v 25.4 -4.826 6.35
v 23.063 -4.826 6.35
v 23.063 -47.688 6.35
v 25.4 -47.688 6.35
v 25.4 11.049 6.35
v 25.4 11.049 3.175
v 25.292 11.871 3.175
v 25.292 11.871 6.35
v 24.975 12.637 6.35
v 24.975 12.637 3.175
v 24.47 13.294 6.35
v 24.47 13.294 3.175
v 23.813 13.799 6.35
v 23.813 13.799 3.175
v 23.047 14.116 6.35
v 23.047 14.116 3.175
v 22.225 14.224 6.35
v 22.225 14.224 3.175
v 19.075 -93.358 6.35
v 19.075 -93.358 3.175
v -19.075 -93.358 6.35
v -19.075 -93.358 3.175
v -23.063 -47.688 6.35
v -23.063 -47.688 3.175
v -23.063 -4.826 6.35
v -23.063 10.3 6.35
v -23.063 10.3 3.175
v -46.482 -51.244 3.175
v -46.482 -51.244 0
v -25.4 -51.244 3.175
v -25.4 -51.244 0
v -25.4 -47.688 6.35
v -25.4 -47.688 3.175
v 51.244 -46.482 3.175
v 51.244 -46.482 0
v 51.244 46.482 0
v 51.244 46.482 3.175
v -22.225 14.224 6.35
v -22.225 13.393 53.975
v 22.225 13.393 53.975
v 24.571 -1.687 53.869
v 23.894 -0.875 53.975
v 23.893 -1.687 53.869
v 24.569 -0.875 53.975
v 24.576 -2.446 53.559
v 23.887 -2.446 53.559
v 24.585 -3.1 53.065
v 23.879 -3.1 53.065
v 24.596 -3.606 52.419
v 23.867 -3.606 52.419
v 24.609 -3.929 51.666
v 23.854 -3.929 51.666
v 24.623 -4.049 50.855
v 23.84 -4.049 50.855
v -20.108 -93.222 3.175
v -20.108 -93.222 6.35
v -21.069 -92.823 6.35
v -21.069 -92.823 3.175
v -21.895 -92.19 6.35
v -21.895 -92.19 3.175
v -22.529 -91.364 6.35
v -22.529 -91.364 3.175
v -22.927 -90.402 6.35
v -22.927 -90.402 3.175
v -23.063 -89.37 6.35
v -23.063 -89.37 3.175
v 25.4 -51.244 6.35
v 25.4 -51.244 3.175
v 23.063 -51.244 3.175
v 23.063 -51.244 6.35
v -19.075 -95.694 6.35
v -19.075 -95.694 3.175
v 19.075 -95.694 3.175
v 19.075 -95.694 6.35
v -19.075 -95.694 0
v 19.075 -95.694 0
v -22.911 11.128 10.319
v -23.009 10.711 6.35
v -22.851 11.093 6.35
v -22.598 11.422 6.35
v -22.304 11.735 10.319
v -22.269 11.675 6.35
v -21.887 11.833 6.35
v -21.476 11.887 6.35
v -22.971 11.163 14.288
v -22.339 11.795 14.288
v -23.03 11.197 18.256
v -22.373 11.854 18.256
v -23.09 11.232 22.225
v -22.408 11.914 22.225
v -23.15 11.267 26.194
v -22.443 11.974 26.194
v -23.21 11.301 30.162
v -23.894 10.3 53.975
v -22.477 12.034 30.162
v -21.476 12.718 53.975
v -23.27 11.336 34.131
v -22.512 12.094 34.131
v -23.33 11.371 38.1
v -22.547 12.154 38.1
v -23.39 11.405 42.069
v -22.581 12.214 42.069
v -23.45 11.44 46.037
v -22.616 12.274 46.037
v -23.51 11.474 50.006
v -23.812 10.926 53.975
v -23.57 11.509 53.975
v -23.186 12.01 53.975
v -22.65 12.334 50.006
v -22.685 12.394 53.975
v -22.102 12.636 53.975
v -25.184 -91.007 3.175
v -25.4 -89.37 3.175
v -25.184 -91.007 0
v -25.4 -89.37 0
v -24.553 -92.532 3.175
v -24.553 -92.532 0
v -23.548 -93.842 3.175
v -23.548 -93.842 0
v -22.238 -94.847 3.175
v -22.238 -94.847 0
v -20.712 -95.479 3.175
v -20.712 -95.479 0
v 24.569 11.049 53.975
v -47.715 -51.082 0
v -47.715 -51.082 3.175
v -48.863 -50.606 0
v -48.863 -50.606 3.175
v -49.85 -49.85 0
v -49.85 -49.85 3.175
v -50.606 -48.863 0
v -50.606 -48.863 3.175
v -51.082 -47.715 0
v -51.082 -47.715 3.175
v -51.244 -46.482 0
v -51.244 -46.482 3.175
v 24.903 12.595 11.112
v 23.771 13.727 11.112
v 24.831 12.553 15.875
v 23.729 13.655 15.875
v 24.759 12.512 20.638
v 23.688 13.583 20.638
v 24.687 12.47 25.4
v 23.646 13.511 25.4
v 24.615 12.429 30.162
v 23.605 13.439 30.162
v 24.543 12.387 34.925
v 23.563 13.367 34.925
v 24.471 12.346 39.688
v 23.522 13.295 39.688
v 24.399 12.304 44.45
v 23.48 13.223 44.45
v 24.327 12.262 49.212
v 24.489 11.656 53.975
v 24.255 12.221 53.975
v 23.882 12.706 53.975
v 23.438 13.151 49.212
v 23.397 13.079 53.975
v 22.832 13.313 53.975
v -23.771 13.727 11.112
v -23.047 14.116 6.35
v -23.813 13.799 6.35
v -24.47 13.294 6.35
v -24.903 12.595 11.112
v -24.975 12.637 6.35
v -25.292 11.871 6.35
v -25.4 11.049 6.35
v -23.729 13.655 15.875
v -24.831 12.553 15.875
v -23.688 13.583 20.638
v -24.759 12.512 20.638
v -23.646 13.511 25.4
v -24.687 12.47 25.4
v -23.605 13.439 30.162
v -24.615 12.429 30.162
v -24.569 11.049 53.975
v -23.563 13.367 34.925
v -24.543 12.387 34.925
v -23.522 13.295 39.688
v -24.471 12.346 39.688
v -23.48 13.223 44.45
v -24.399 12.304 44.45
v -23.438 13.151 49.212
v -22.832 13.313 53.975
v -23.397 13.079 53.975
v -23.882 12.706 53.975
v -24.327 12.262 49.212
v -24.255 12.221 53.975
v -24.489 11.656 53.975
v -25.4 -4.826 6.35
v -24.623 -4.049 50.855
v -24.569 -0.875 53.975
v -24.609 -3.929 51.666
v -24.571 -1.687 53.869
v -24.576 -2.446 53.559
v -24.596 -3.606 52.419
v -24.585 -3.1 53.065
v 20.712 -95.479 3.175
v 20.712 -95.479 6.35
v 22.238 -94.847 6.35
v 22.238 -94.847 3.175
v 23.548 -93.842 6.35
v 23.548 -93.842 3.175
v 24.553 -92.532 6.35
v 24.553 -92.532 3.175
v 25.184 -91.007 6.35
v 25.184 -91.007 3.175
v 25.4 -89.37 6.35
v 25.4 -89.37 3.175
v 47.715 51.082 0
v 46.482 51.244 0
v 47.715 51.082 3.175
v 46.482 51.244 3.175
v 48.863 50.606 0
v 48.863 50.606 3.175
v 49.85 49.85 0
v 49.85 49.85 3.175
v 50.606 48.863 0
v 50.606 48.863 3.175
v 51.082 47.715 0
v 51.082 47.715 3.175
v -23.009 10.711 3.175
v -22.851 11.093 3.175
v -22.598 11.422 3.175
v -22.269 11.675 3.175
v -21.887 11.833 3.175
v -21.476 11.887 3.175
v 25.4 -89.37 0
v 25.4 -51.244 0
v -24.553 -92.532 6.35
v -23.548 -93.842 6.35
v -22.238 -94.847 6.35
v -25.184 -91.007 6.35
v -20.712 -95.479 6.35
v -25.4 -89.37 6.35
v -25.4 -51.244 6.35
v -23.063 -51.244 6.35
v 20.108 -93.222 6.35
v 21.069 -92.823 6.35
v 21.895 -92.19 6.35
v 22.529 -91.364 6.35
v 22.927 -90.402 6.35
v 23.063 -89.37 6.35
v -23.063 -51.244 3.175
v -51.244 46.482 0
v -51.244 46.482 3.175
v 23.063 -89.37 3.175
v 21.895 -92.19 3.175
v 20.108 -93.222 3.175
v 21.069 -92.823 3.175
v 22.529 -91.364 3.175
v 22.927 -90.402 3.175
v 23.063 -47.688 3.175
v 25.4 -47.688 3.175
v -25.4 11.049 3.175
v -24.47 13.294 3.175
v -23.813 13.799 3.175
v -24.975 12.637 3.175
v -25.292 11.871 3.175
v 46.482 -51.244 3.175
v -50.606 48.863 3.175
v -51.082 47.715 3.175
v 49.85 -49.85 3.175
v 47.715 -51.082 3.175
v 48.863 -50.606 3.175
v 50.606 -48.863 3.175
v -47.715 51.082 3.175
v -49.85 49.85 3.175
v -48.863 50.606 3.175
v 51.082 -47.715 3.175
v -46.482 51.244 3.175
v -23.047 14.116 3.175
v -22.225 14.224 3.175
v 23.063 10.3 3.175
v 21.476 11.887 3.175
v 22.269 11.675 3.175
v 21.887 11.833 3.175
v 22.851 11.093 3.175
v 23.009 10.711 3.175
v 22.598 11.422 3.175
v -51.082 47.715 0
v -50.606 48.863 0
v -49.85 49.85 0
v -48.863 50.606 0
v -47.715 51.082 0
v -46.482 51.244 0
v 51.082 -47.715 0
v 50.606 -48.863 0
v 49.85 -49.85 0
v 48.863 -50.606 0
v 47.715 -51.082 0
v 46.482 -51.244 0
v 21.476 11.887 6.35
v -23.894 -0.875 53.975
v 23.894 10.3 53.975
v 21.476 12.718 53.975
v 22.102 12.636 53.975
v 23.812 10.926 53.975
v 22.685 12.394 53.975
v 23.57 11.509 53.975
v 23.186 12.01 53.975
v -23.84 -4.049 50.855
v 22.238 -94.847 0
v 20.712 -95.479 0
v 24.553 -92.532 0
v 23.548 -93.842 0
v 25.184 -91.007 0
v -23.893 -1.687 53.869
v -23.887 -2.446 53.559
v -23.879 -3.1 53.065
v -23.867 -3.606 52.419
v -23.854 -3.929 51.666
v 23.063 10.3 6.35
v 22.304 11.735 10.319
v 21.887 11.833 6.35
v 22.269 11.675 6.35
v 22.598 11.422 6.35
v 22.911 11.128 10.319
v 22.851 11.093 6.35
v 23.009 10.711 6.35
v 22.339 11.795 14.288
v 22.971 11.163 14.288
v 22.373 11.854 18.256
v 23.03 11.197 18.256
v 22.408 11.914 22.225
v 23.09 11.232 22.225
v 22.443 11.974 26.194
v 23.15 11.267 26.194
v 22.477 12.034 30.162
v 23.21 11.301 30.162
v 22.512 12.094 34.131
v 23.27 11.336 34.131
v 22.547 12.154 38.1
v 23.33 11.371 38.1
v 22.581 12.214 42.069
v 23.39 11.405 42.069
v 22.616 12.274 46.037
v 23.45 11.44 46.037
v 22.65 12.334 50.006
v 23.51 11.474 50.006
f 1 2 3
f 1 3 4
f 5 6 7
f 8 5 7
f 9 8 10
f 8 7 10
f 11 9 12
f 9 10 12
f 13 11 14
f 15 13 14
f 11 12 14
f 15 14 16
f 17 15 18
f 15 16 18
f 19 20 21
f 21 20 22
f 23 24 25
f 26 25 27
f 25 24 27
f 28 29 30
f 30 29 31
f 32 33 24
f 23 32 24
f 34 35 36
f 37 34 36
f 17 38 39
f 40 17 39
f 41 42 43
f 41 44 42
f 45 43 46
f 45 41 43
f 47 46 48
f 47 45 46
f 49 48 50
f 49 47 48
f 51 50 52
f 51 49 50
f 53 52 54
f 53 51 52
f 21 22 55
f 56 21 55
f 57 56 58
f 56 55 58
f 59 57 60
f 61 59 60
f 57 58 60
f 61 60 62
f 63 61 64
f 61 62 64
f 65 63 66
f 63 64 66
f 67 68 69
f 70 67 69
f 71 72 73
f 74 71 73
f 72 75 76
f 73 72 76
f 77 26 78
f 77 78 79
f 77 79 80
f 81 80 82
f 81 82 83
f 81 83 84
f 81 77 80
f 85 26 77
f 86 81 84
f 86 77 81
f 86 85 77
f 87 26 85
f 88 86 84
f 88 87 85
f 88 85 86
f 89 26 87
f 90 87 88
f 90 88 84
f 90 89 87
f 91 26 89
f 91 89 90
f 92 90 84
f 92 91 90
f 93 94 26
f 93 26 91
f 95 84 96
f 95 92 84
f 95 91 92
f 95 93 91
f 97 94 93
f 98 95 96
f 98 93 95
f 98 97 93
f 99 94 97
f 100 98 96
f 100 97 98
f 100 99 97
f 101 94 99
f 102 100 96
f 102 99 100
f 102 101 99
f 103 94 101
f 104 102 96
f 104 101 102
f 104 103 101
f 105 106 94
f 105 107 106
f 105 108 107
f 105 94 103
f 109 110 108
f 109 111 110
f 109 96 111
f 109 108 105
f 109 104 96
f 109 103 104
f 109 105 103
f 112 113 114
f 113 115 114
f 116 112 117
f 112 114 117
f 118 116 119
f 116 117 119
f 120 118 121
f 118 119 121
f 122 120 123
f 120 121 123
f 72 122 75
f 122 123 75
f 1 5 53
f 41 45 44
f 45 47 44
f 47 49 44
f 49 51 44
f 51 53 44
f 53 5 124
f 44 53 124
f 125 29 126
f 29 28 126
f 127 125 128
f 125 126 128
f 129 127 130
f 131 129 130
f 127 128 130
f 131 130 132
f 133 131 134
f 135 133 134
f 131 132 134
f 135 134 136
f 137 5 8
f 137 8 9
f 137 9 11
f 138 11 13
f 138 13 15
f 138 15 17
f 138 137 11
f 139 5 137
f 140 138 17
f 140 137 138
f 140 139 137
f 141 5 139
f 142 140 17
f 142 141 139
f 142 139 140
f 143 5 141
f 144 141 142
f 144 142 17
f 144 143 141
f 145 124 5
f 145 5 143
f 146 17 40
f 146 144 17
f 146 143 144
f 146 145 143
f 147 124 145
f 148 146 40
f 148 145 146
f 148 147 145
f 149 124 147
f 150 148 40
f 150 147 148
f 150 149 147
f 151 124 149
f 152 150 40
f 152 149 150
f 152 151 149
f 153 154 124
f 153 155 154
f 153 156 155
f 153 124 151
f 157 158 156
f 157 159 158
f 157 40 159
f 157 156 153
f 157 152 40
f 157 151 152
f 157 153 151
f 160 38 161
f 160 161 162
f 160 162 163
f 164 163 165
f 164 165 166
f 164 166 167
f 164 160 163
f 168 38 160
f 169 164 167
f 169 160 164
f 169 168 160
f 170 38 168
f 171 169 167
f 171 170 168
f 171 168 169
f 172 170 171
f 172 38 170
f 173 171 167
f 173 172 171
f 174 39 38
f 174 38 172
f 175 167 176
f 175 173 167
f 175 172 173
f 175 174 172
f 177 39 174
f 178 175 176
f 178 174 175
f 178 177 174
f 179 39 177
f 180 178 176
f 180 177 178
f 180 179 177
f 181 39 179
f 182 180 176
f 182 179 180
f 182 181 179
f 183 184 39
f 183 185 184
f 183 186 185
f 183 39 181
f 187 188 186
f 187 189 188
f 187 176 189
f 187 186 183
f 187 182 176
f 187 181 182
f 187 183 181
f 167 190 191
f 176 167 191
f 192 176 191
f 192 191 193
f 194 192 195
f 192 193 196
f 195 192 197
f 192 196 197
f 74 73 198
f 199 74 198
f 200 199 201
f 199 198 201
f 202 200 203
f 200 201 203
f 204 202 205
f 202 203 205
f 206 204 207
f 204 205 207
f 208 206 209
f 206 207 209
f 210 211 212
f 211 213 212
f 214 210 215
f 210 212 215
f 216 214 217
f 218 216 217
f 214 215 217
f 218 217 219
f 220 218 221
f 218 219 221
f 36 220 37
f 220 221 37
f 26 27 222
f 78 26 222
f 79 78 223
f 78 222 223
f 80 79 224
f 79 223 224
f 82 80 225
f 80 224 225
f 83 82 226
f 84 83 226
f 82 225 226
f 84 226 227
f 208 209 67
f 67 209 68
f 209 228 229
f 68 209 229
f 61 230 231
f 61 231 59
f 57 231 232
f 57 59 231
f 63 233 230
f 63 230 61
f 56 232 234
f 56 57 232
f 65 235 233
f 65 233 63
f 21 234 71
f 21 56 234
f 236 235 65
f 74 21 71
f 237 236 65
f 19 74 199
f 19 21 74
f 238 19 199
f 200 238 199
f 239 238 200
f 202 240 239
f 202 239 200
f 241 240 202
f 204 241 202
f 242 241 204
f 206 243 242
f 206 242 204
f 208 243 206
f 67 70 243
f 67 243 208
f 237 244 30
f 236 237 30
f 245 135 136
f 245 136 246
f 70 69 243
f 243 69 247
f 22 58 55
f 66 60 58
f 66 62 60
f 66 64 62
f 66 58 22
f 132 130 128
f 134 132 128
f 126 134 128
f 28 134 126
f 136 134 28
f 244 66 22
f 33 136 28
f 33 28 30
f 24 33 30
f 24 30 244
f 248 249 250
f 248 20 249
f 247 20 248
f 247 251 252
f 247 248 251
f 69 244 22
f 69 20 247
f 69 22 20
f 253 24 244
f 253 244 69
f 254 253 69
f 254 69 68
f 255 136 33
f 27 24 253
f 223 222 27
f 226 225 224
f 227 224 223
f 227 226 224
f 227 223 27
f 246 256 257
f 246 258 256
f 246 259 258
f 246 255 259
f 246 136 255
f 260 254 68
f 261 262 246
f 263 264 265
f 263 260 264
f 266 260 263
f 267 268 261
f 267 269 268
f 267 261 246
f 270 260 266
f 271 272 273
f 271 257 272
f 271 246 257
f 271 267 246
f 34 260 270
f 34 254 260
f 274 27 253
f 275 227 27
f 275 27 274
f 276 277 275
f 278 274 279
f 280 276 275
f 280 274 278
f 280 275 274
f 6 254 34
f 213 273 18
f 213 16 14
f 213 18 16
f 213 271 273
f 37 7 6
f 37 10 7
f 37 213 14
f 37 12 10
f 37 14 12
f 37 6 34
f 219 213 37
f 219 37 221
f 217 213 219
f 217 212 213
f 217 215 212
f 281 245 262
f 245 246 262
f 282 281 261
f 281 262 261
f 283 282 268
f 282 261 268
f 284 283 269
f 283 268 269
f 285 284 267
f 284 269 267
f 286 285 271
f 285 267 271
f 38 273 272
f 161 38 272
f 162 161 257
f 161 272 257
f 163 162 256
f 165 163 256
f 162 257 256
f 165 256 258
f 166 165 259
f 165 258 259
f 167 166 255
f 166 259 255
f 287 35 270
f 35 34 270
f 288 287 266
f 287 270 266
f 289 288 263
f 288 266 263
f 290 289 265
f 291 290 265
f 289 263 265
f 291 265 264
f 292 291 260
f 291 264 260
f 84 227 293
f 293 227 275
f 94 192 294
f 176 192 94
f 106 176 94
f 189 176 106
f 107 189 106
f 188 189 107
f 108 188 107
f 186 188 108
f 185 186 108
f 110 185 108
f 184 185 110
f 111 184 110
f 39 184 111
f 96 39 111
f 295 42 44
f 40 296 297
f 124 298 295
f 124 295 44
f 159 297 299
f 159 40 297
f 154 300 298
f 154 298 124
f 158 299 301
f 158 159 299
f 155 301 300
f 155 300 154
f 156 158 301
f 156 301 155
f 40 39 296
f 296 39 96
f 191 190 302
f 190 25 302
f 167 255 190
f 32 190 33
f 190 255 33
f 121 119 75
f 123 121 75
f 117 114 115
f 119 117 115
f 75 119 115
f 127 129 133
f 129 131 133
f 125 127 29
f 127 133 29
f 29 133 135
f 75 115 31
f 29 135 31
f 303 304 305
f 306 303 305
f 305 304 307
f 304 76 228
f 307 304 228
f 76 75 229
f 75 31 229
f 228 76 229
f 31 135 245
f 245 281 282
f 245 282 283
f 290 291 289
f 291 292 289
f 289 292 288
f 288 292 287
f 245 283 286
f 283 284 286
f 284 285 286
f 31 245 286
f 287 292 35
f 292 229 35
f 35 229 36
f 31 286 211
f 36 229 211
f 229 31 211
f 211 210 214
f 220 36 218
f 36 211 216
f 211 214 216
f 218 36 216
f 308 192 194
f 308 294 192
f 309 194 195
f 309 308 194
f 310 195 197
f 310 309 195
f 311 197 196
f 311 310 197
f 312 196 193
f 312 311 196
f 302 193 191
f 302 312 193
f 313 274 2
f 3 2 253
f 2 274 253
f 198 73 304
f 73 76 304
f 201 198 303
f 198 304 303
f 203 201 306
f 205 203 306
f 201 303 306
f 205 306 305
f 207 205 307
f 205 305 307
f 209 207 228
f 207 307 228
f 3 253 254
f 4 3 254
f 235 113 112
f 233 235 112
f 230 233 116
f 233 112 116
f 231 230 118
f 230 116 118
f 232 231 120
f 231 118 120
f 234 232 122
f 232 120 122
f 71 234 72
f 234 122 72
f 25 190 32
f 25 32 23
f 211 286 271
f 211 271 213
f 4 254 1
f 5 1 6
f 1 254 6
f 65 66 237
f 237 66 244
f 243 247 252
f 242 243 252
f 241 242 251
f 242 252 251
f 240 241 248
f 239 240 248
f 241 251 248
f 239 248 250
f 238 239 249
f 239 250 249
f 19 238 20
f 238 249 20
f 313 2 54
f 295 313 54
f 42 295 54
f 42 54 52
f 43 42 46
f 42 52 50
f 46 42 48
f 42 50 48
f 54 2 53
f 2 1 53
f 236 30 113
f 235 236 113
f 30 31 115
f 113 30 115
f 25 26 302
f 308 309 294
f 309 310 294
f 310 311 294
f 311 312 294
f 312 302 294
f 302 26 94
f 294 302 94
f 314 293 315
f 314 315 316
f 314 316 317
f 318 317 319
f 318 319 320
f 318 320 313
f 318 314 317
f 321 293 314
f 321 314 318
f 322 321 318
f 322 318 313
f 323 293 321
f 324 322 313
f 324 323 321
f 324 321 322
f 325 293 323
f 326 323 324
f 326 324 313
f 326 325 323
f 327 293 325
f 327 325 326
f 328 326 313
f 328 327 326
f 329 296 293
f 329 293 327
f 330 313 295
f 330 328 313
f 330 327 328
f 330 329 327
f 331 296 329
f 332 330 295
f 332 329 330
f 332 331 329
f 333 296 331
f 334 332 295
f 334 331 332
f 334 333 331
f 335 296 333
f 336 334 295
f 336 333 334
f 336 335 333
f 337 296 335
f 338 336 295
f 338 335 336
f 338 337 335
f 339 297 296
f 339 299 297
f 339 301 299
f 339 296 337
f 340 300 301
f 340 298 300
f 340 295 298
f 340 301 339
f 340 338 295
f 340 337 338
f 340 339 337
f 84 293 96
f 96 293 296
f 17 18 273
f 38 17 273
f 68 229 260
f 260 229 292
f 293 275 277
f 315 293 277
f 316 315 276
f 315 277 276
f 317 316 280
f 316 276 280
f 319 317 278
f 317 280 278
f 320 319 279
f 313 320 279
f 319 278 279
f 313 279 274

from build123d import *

# Parameters (mm, degrees)
F0_W     = 102.489
F0_H     = 102.489
F1_DEPTH = 3.175
F2_W     = 50.8
F2_H     = 44.45
F3_DEPTH = 3.175
F4_R     = 6.3246
F5_R     = 4.7625
F7_DEPTH = 3.175
F9_DEPTH = 47.625
F9_TAPER = 1
F10_R    = 3.175


with BuildPart() as f1:
    # F0 (on Top) → F1 (new body)
    with BuildSketch(Plane.XY):
        Rectangle(F0_W, F0_H)
    extrude(amount=F1_DEPTH)

    # F2 (on face) → F3 (join)
    with BuildSketch(Plane.XY.offset(3.175)):
        with Locations((0, -73.4695)):
            Rectangle(F2_W, F2_H)
    extrude(amount=-F3_DEPTH)

    # F4
    f4_edges = [f1.edges().sort_by_distance(p)[0] for p in [
        (25.4, -95.6945, 1.5875),
        (-25.4, -95.6945, 1.5875),
    ]]
    fillet(f4_edges, radius=F4_R)

    # F5
    f5_edges = [f1.edges().sort_by_distance(p)[0] for p in [
        (-51.2445, -51.2445, 1.5875),
        (51.2445, -51.2445, 1.5875),
        (51.2445, 51.2445, 1.5875),
        (-51.2445, 51.2445, 1.5875),
    ]]
    fillet(f5_edges, radius=F5_R)

    # F6 (on face) → F7 (join)
    with BuildSketch(Plane.XY.offset(3.175)):
        with BuildLine():
            Line((-25.4, 11.049), (-25.4, -47.6885))
            Line((-25.4, -47.6885), (-23.0632, -47.6885))
            Line((-23.0632, -47.6885), (-23.0632, 10.2997))
            ThreePointArc((-23.0632, 10.2997), (-22.5982320151, 11.4222320151), (-21.4757, 11.8872))
            Line((-21.4757, 11.8872), (21.4757, 11.8872))
            ThreePointArc((21.4757, 11.8872), (22.5982320151, 11.4222320151), (23.0632, 10.2997))
            Line((23.0632, 10.2997), (23.0632, -47.6885))
            Line((23.0632, -47.6885), (25.4, -47.6885))
            Line((25.4, -47.6885), (25.4, 11.049))
            ThreePointArc((25.4, 11.049), (24.4700640303, 13.2940640303), (22.225, 14.224))
            Line((22.225, 14.224), (-22.225, 14.224))
            ThreePointArc((-22.225, 14.224), (-24.4700640303, 13.2940640303), (-25.4, 11.049))
        make_face()
        with BuildLine():
            Line((25.4, -89.3699), (25.4, -51.2445))
            Line((25.4, -51.2445), (23.0632, -51.2445))
            Line((23.0632, -51.2445), (23.0632, -89.3699))
            ThreePointArc((23.0632, -89.3699), (21.895200422, -92.189700422), (19.0754, -93.3577))
            Line((19.0754, -93.3577), (-19.0754, -93.3577))
            ThreePointArc((-19.0754, -93.3577), (-21.895200422, -92.189700422), (-23.0632, -89.3699))
            Line((-23.0632, -89.3699), (-23.0632, -51.2445))
            Line((-23.0632, -51.2445), (-25.4, -51.2445))
            Line((-25.4, -51.2445), (-25.4, -89.3699))
            ThreePointArc((-25.4, -89.3699), (-23.5475675483, -93.8420675483), (-19.0754, -95.6945))
            Line((-19.0754, -95.6945), (19.0754, -95.6945))
            ThreePointArc((19.0754, -95.6945), (23.5475675483, -93.8420675483), (25.4, -89.3699))
        make_face()
    extrude(amount=F7_DEPTH)

    # F8 (on face) → F9 (join)
    with BuildSketch(Plane.XY.offset(6.35)):
        with BuildLine():
            Line((-21.4757, 11.8872), (21.4757, 11.8872))
            ThreePointArc((21.4757, 11.8872), (22.5982320151, 11.4222320151), (23.0632, 10.2997))
            Line((23.0632, 10.2997), (23.0632, -4.826))
            Line((23.0632, -4.826), (25.4, -4.826))
            Line((25.4, -4.826), (25.4, 11.049))
            ThreePointArc((25.4, 11.049), (24.4700640303, 13.2940640303), (22.225, 14.224))
            Line((22.225, 14.224), (-22.225, 14.224))
            ThreePointArc((-22.225, 14.224), (-24.4700640303, 13.2940640303), (-25.4, 11.049))
            Line((-25.4, 11.049), (-25.4, -4.826))
            Line((-25.4, -4.826), (-23.0632, -4.826))
            Line((-23.0632, -4.826), (-23.0632, 10.2997))
            ThreePointArc((-23.0632, 10.2997), (-22.5982320151, 11.4222320151), (-21.4757, 11.8872))
        make_face()
    extrude(amount=F9_DEPTH, taper=F9_TAPER)

    # F10
    f10_edges = [f1.edges().sort_by_distance(p)[0] for p in [
        (-24.2316, -3.994703, 53.975),
        (24.2316, -3.994703, 53.975),
    ]]
    fillet(f10_edges, radius=F10_R)


solid = f1.part
